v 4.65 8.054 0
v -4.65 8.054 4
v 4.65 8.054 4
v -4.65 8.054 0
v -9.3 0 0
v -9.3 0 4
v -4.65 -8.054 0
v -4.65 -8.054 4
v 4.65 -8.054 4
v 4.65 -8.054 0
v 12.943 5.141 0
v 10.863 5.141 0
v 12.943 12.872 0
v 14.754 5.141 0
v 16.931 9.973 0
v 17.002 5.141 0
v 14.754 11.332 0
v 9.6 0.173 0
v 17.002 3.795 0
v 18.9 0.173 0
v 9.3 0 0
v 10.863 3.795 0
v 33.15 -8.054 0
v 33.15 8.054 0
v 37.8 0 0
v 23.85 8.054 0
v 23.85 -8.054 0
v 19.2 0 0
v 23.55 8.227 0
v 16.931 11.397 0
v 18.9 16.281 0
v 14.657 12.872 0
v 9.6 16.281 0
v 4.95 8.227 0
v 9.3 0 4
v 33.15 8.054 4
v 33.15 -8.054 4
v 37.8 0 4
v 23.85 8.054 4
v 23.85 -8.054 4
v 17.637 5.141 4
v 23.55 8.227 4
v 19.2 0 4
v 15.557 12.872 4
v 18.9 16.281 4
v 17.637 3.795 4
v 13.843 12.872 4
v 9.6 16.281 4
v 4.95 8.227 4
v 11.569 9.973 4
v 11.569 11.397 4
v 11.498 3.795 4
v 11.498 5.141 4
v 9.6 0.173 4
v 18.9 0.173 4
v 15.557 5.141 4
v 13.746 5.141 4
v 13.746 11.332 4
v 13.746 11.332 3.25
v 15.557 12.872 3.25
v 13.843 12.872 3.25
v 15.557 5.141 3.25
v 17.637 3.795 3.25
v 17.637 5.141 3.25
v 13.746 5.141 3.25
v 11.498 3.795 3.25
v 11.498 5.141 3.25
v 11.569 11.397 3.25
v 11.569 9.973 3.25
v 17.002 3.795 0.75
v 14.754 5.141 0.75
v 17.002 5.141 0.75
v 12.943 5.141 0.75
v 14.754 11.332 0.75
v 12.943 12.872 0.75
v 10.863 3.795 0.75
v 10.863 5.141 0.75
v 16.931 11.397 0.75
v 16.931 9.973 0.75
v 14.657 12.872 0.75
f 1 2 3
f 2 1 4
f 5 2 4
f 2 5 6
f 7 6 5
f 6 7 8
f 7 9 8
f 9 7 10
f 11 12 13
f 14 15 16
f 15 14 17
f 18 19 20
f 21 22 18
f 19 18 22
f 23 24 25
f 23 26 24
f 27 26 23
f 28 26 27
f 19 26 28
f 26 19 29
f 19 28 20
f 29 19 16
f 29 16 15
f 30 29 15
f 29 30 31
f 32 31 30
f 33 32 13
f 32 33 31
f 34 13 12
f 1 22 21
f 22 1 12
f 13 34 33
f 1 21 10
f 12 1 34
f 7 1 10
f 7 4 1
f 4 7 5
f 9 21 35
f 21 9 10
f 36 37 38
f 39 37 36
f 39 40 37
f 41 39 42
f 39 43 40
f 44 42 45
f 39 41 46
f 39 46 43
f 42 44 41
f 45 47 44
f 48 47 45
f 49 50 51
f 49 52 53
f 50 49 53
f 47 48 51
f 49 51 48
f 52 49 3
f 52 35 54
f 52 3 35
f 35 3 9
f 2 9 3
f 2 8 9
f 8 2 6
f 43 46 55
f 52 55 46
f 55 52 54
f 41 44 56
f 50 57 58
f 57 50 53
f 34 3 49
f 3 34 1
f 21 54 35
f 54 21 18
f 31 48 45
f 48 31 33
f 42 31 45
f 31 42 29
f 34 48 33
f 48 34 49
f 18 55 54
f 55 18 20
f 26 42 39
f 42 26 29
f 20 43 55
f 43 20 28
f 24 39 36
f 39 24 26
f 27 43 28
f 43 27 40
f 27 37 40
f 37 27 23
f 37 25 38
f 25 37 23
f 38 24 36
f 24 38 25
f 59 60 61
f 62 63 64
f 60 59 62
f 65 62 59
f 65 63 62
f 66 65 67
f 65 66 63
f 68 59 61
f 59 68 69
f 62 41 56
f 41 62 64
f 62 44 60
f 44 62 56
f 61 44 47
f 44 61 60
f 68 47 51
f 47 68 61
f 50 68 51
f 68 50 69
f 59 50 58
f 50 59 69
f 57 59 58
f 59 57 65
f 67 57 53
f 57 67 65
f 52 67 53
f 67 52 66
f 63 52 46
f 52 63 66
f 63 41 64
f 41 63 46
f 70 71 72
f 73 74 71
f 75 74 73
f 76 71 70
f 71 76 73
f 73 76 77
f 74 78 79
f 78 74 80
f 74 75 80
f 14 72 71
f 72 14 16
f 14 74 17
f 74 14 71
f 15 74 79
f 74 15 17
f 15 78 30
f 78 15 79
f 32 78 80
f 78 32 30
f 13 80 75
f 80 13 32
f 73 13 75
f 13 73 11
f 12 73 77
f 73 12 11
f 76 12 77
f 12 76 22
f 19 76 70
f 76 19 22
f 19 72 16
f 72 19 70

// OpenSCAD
// expects parameter N of <1,15>
// example use: "c:\Program Files\OpenSCAD\openscad.com" -o stl\tile_3.stl -D "N=3" cmdline_element.scad

/* config */
height = 4;
halfsize = 9.5;
fontHeight = 0.8;
fontFactor = 1;
play = 0.2;
eps = 0.05;

/* request */
N = 1;
//hex();

if (N == 1) {
    tile1();
} else if (N == 2) {
    tile2();
} else if (N == 3) {
    tile3();
} else if (N == 4) {
    tile4();
} else if (N == 5) {
    tile5();
} else if (N == 6) {
    tile6();
} else if (N == 7) {
    tile7();
} else if (N == 8) {
    tile8();
} else if (N == 9) {
    tile9();
} else if (N == 10) {
    tile10();
} else if (N == 11) {
    tile11();
} else if (N == 12) {
    tile12();
} else if (N == 13) {
    tile13();
} else if (N == 14) {
    tile14();
} else if (N == 15) {
    tile15();
}

/* code */
fontSize = halfsize * fontFactor;
yDim = sqrt(3) * halfsize;
yShift = yDim / 3;

module hex(edgeConns = [], vertexConns = []) {
    linear_extrude(height)
        regular_polygon(6, halfsize - play);

    for (edgeConn = edgeConns) {
        edgeConnector(edgeConn);
    }

    for (vertexConn = vertexConns) {
        vertexConnector(vertexConn);
    }
}

module edgeConnector(location) {
    color([255/255, 0/255, 0/255], 0.5) 

    rotate([0, 0, 30 + location * 60])
        translate([yDim / 2, 0, height / 2])    
            cube(size=[3*play, halfsize - play, height], center=true);
}

module vertexConnector(location) {
    color([0/255, 0/255, 255/255], 0.5) 
    
    rotate([0, 0, 60 * location])
        translate([halfsize, 0, height / 2])    
            cube(size=[3*play, 3*play, height], center=true);
}

module number(trans = [0,0,0], rot = 0, num = 0) {
    translate([0,0,-fontHeight + eps]) translate(trans) rotate([0,0,rot]) linear_extrude(fontHeight)
         text(num, font = "Liberation Sans:style=Bold", size = fontSize, halign = "center", valign = "center"); 

    translate([0,0,-height - eps]) translate(trans) rotate([0,0,rot]) linear_extrude(fontHeight) mirror([1, 0, 0])
        text(num, font = "Liberation Sans:style=Bold", size = fontSize, halign = "center", valign = "center"); 
}


module regular_polygon(order, r){
    angles=[ for (i = [0:order-1]) i*(360/order) ];
    coords=[ for (th=angles) [r*cos(th), r*sin(th)] ];
    polygon(coords);
}

module tile1() {
    difference() {
        union() {
            hex(edgeConns = [0]);
            translate([1.5 * halfsize, yDim / 2, 0]) hex(edgeConns = [5]);
            translate([3 * halfsize, 0, 0]) hex();
        }
        number([1.5 * halfsize, yDim / 2, height], 0, "1");
    }
}

module tile2() {
    difference() {
        union() {
            hex(edgeConns = [0]);
            translate([1.5 * halfsize, yDim / 2, 0]) hex(edgeConns = [5]);
            translate([3 * halfsize, 0, 0]) hex(edgeConns = [5]);
            translate([4.5 * halfsize, -yDim / 2, 0]) hex();
        }
        number([1.5 * halfsize, yDim / 2, height], 0, "2");
    }
}

module tile3() {
    difference() {
        union() {
            hex(edgeConns = [0, 5]);
            translate([1.5 * halfsize, yDim / 2, 0]) hex(edgeConns = [4, 5]);
            translate([3 * halfsize, 0, 0]) hex(edgeConns = [3, 5]);
            translate([4.5 * halfsize, -yDim / 2, 0]) hex();
            translate([1.5 * halfsize, -yDim / 2, 0]) hex(vertexConns = [1, 2]);
        }
        number([1.5 * halfsize, 0, height], 120, "3");
    }
}

module tile4() {
    difference() {
        union() {
            hex(edgeConns = [0, 5]);
            translate([1.5 * halfsize, yDim / 2, 0]) hex(edgeConns = [4, 5]);
            translate([3 * halfsize, 0, 0]) hex(edgeConns = [3]);
            translate([1.5 * halfsize, -yDim / 2, 0]) hex(vertexConns = [0, 1, 2]);
            translate([3 * halfsize, -yDim, 0]) hex(edgeConns = [1, 2]);
        }
        number([2 * halfsize, -yShift / 2, height], 240, "4");
    }
}

module tile5() {
    difference() {
        union() {
            hex(edgeConns = [0, 5]);
            translate([1.5 * halfsize, yDim / 2, 0]) hex();
            // translate([3 * halfsize, 0, 0]) hex();
            translate([1.5 * halfsize, -yDim / 2, 0]) hex(edgeConns = [1, 5]);
            translate([4.5 * halfsize, -yDim / 2, 0]) hex(edgeConns = [3]);
            translate([3 * halfsize, -yDim, 0]) hex();
        }
        number([halfsize, 0, height], -30, "5");
    }
}

module tile6() {
    difference() {
        union() {
            hex(edgeConns = [1, 5]);
            translate([1.5 * halfsize, yDim / 2, 0]) hex(edgeConns = [0, 2, 3, 4]);
            translate([0, yDim, 0]) hex();
            translate([1.5 * halfsize, -yDim / 2, 0]) hex();
            translate([3 * halfsize, yDim, 0]) hex();
        }
        number([2 * halfsize / 3, yDim / 3, height], 60, "6.");
    }
}

module tile7() {
    difference() {
        union() {
            hex(edgeConns = [0, 5]);
            translate([1.5 * halfsize, yDim / 2, 0]) hex();
            translate([1.5 * halfsize, -yDim / 2, 0]) hex(edgeConns = [1, 4, 5], vertexConns = [2, 5]);
            translate([3 * halfsize, -yDim, 0]) hex(edgeConns = [3]);
            translate([1.5 * halfsize, -1.5 * yDim, 0]) hex();
        }
        number([halfsize, 0, height], -30, "7");
    }
}

module tile8() {
    difference() {
        union() {
            translate([1.5 * halfsize, yDim / 2, 0]) hex(edgeConns = [4, 5], vertexConns = [5]);
            translate([3 * halfsize, 0, 0]) hex(edgeConns = [3, 5]);
            translate([1.5 * halfsize, -yDim / 2, 0]) hex();
            translate([4.5 * halfsize, -yDim / 2, 0]) hex();
            translate([6 * halfsize, 0, 0]) hex(edgeConns = [3]);
        }
        number([2 * halfsize, 0, height], 240, "8");
    }
}

module tile9() {
    difference() {
        union() {
            hex(edgeConns = [0, 4]);
            translate([1.5 * halfsize, yDim / 2, 0]) hex();
            translate([3 * halfsize, 0, 0]) hex(edgeConns = [2, 5]);
            translate([4.5 * halfsize, -yDim / 2, 0]) hex();
            translate([0, -yDim, 0]) hex();
        }
        number([0, 0, height], 180, "9.");
    }
}

module tile10() {
    difference() {
        union() {
            hex();
            translate([1.5 * halfsize, yDim / 2, 0]) hex(edgeConns = [0, 3, 5]);
            translate([3 * halfsize, 0, 0]) hex(edgeConns = [1, 5], vertexConns = [2]);
            translate([4.5 * halfsize, -yDim / 2, 0]) hex();
            translate([3 * halfsize, yDim, 0]) hex();
        }
        number([2.5 * halfsize, 1.33 * yDim / 2, height], 210, "10");
    }
}

module tile11() {
    difference() {
        union() {
            translate([1.5 * halfsize, yDim / 2, 0]) hex();
            translate([3 * halfsize, -2 * yDim, 0]) hex();
            translate([1.5 * halfsize, -yDim / 2, 0]) hex(edgeConns = [1]);
            translate([4.5 * halfsize, -yDim / 2, 0]) hex();
            translate([3 * halfsize, -yDim, 0]) hex(edgeConns = [0, 2, 4]);
        }
        number([3 * halfsize, -yDim, height], -30, "11");
    }
}

module tile12() {
    difference() {
        union() {
            translate([1.5 * halfsize, yDim / 2, 0]) hex();
            translate([3 * halfsize, 0, 0]) hex(edgeConns = [2, 3, 4]);
            translate([1.5 * halfsize, -yDim / 2, 0]) hex(edgeConns = [1, 5], vertexConns = [0, 1]);
            translate([3 * halfsize, -yDim, 0]) hex();
        }
        number([2.25 * halfsize, -yShift / 2, height], 270, "12");
    }
}

module tile13() {
    difference() {
        union() {
            hex(edgeConns = [0, 4]);
            translate([1.5 * halfsize, yDim / 2, 0]) hex();
            translate([3 * halfsize, 0, 0]) hex(edgeConns = [2]);
            translate([0, -yDim, 0]) hex();
        }
        number([1.5 * halfsize, yDim / 2, height], 120, "13");
    }
}

module tile14() {
    difference() {
        union() {
            translate([1.5 * halfsize, yDim / 2, 0]) hex(edgeConns = [4]);
            translate([3 * halfsize, 0, 0]) hex(edgeConns = [2, 3, 5], vertexConns = [3]);
            translate([1.5 * halfsize, -yDim / 2, 0]) hex();
            translate([4.5 * halfsize, -yDim / 2, 0]) hex();
        }
        number([2.25 * halfsize, 0, height], 180, "14");
    }
}

module tile15() {
    difference() {
        union() {
            hex(edgeConns = [5]);
            translate([3 * halfsize, 0, 0]) hex(edgeConns = [3, 5]);
            translate([1.5 * halfsize, -yDim / 2, 0]) hex();
            translate([4.5 * halfsize, -yDim / 2, 0]) hex();
        }
        number([4.5 * halfsize, -yDim / 2, height], 120, "15");
    }
}
